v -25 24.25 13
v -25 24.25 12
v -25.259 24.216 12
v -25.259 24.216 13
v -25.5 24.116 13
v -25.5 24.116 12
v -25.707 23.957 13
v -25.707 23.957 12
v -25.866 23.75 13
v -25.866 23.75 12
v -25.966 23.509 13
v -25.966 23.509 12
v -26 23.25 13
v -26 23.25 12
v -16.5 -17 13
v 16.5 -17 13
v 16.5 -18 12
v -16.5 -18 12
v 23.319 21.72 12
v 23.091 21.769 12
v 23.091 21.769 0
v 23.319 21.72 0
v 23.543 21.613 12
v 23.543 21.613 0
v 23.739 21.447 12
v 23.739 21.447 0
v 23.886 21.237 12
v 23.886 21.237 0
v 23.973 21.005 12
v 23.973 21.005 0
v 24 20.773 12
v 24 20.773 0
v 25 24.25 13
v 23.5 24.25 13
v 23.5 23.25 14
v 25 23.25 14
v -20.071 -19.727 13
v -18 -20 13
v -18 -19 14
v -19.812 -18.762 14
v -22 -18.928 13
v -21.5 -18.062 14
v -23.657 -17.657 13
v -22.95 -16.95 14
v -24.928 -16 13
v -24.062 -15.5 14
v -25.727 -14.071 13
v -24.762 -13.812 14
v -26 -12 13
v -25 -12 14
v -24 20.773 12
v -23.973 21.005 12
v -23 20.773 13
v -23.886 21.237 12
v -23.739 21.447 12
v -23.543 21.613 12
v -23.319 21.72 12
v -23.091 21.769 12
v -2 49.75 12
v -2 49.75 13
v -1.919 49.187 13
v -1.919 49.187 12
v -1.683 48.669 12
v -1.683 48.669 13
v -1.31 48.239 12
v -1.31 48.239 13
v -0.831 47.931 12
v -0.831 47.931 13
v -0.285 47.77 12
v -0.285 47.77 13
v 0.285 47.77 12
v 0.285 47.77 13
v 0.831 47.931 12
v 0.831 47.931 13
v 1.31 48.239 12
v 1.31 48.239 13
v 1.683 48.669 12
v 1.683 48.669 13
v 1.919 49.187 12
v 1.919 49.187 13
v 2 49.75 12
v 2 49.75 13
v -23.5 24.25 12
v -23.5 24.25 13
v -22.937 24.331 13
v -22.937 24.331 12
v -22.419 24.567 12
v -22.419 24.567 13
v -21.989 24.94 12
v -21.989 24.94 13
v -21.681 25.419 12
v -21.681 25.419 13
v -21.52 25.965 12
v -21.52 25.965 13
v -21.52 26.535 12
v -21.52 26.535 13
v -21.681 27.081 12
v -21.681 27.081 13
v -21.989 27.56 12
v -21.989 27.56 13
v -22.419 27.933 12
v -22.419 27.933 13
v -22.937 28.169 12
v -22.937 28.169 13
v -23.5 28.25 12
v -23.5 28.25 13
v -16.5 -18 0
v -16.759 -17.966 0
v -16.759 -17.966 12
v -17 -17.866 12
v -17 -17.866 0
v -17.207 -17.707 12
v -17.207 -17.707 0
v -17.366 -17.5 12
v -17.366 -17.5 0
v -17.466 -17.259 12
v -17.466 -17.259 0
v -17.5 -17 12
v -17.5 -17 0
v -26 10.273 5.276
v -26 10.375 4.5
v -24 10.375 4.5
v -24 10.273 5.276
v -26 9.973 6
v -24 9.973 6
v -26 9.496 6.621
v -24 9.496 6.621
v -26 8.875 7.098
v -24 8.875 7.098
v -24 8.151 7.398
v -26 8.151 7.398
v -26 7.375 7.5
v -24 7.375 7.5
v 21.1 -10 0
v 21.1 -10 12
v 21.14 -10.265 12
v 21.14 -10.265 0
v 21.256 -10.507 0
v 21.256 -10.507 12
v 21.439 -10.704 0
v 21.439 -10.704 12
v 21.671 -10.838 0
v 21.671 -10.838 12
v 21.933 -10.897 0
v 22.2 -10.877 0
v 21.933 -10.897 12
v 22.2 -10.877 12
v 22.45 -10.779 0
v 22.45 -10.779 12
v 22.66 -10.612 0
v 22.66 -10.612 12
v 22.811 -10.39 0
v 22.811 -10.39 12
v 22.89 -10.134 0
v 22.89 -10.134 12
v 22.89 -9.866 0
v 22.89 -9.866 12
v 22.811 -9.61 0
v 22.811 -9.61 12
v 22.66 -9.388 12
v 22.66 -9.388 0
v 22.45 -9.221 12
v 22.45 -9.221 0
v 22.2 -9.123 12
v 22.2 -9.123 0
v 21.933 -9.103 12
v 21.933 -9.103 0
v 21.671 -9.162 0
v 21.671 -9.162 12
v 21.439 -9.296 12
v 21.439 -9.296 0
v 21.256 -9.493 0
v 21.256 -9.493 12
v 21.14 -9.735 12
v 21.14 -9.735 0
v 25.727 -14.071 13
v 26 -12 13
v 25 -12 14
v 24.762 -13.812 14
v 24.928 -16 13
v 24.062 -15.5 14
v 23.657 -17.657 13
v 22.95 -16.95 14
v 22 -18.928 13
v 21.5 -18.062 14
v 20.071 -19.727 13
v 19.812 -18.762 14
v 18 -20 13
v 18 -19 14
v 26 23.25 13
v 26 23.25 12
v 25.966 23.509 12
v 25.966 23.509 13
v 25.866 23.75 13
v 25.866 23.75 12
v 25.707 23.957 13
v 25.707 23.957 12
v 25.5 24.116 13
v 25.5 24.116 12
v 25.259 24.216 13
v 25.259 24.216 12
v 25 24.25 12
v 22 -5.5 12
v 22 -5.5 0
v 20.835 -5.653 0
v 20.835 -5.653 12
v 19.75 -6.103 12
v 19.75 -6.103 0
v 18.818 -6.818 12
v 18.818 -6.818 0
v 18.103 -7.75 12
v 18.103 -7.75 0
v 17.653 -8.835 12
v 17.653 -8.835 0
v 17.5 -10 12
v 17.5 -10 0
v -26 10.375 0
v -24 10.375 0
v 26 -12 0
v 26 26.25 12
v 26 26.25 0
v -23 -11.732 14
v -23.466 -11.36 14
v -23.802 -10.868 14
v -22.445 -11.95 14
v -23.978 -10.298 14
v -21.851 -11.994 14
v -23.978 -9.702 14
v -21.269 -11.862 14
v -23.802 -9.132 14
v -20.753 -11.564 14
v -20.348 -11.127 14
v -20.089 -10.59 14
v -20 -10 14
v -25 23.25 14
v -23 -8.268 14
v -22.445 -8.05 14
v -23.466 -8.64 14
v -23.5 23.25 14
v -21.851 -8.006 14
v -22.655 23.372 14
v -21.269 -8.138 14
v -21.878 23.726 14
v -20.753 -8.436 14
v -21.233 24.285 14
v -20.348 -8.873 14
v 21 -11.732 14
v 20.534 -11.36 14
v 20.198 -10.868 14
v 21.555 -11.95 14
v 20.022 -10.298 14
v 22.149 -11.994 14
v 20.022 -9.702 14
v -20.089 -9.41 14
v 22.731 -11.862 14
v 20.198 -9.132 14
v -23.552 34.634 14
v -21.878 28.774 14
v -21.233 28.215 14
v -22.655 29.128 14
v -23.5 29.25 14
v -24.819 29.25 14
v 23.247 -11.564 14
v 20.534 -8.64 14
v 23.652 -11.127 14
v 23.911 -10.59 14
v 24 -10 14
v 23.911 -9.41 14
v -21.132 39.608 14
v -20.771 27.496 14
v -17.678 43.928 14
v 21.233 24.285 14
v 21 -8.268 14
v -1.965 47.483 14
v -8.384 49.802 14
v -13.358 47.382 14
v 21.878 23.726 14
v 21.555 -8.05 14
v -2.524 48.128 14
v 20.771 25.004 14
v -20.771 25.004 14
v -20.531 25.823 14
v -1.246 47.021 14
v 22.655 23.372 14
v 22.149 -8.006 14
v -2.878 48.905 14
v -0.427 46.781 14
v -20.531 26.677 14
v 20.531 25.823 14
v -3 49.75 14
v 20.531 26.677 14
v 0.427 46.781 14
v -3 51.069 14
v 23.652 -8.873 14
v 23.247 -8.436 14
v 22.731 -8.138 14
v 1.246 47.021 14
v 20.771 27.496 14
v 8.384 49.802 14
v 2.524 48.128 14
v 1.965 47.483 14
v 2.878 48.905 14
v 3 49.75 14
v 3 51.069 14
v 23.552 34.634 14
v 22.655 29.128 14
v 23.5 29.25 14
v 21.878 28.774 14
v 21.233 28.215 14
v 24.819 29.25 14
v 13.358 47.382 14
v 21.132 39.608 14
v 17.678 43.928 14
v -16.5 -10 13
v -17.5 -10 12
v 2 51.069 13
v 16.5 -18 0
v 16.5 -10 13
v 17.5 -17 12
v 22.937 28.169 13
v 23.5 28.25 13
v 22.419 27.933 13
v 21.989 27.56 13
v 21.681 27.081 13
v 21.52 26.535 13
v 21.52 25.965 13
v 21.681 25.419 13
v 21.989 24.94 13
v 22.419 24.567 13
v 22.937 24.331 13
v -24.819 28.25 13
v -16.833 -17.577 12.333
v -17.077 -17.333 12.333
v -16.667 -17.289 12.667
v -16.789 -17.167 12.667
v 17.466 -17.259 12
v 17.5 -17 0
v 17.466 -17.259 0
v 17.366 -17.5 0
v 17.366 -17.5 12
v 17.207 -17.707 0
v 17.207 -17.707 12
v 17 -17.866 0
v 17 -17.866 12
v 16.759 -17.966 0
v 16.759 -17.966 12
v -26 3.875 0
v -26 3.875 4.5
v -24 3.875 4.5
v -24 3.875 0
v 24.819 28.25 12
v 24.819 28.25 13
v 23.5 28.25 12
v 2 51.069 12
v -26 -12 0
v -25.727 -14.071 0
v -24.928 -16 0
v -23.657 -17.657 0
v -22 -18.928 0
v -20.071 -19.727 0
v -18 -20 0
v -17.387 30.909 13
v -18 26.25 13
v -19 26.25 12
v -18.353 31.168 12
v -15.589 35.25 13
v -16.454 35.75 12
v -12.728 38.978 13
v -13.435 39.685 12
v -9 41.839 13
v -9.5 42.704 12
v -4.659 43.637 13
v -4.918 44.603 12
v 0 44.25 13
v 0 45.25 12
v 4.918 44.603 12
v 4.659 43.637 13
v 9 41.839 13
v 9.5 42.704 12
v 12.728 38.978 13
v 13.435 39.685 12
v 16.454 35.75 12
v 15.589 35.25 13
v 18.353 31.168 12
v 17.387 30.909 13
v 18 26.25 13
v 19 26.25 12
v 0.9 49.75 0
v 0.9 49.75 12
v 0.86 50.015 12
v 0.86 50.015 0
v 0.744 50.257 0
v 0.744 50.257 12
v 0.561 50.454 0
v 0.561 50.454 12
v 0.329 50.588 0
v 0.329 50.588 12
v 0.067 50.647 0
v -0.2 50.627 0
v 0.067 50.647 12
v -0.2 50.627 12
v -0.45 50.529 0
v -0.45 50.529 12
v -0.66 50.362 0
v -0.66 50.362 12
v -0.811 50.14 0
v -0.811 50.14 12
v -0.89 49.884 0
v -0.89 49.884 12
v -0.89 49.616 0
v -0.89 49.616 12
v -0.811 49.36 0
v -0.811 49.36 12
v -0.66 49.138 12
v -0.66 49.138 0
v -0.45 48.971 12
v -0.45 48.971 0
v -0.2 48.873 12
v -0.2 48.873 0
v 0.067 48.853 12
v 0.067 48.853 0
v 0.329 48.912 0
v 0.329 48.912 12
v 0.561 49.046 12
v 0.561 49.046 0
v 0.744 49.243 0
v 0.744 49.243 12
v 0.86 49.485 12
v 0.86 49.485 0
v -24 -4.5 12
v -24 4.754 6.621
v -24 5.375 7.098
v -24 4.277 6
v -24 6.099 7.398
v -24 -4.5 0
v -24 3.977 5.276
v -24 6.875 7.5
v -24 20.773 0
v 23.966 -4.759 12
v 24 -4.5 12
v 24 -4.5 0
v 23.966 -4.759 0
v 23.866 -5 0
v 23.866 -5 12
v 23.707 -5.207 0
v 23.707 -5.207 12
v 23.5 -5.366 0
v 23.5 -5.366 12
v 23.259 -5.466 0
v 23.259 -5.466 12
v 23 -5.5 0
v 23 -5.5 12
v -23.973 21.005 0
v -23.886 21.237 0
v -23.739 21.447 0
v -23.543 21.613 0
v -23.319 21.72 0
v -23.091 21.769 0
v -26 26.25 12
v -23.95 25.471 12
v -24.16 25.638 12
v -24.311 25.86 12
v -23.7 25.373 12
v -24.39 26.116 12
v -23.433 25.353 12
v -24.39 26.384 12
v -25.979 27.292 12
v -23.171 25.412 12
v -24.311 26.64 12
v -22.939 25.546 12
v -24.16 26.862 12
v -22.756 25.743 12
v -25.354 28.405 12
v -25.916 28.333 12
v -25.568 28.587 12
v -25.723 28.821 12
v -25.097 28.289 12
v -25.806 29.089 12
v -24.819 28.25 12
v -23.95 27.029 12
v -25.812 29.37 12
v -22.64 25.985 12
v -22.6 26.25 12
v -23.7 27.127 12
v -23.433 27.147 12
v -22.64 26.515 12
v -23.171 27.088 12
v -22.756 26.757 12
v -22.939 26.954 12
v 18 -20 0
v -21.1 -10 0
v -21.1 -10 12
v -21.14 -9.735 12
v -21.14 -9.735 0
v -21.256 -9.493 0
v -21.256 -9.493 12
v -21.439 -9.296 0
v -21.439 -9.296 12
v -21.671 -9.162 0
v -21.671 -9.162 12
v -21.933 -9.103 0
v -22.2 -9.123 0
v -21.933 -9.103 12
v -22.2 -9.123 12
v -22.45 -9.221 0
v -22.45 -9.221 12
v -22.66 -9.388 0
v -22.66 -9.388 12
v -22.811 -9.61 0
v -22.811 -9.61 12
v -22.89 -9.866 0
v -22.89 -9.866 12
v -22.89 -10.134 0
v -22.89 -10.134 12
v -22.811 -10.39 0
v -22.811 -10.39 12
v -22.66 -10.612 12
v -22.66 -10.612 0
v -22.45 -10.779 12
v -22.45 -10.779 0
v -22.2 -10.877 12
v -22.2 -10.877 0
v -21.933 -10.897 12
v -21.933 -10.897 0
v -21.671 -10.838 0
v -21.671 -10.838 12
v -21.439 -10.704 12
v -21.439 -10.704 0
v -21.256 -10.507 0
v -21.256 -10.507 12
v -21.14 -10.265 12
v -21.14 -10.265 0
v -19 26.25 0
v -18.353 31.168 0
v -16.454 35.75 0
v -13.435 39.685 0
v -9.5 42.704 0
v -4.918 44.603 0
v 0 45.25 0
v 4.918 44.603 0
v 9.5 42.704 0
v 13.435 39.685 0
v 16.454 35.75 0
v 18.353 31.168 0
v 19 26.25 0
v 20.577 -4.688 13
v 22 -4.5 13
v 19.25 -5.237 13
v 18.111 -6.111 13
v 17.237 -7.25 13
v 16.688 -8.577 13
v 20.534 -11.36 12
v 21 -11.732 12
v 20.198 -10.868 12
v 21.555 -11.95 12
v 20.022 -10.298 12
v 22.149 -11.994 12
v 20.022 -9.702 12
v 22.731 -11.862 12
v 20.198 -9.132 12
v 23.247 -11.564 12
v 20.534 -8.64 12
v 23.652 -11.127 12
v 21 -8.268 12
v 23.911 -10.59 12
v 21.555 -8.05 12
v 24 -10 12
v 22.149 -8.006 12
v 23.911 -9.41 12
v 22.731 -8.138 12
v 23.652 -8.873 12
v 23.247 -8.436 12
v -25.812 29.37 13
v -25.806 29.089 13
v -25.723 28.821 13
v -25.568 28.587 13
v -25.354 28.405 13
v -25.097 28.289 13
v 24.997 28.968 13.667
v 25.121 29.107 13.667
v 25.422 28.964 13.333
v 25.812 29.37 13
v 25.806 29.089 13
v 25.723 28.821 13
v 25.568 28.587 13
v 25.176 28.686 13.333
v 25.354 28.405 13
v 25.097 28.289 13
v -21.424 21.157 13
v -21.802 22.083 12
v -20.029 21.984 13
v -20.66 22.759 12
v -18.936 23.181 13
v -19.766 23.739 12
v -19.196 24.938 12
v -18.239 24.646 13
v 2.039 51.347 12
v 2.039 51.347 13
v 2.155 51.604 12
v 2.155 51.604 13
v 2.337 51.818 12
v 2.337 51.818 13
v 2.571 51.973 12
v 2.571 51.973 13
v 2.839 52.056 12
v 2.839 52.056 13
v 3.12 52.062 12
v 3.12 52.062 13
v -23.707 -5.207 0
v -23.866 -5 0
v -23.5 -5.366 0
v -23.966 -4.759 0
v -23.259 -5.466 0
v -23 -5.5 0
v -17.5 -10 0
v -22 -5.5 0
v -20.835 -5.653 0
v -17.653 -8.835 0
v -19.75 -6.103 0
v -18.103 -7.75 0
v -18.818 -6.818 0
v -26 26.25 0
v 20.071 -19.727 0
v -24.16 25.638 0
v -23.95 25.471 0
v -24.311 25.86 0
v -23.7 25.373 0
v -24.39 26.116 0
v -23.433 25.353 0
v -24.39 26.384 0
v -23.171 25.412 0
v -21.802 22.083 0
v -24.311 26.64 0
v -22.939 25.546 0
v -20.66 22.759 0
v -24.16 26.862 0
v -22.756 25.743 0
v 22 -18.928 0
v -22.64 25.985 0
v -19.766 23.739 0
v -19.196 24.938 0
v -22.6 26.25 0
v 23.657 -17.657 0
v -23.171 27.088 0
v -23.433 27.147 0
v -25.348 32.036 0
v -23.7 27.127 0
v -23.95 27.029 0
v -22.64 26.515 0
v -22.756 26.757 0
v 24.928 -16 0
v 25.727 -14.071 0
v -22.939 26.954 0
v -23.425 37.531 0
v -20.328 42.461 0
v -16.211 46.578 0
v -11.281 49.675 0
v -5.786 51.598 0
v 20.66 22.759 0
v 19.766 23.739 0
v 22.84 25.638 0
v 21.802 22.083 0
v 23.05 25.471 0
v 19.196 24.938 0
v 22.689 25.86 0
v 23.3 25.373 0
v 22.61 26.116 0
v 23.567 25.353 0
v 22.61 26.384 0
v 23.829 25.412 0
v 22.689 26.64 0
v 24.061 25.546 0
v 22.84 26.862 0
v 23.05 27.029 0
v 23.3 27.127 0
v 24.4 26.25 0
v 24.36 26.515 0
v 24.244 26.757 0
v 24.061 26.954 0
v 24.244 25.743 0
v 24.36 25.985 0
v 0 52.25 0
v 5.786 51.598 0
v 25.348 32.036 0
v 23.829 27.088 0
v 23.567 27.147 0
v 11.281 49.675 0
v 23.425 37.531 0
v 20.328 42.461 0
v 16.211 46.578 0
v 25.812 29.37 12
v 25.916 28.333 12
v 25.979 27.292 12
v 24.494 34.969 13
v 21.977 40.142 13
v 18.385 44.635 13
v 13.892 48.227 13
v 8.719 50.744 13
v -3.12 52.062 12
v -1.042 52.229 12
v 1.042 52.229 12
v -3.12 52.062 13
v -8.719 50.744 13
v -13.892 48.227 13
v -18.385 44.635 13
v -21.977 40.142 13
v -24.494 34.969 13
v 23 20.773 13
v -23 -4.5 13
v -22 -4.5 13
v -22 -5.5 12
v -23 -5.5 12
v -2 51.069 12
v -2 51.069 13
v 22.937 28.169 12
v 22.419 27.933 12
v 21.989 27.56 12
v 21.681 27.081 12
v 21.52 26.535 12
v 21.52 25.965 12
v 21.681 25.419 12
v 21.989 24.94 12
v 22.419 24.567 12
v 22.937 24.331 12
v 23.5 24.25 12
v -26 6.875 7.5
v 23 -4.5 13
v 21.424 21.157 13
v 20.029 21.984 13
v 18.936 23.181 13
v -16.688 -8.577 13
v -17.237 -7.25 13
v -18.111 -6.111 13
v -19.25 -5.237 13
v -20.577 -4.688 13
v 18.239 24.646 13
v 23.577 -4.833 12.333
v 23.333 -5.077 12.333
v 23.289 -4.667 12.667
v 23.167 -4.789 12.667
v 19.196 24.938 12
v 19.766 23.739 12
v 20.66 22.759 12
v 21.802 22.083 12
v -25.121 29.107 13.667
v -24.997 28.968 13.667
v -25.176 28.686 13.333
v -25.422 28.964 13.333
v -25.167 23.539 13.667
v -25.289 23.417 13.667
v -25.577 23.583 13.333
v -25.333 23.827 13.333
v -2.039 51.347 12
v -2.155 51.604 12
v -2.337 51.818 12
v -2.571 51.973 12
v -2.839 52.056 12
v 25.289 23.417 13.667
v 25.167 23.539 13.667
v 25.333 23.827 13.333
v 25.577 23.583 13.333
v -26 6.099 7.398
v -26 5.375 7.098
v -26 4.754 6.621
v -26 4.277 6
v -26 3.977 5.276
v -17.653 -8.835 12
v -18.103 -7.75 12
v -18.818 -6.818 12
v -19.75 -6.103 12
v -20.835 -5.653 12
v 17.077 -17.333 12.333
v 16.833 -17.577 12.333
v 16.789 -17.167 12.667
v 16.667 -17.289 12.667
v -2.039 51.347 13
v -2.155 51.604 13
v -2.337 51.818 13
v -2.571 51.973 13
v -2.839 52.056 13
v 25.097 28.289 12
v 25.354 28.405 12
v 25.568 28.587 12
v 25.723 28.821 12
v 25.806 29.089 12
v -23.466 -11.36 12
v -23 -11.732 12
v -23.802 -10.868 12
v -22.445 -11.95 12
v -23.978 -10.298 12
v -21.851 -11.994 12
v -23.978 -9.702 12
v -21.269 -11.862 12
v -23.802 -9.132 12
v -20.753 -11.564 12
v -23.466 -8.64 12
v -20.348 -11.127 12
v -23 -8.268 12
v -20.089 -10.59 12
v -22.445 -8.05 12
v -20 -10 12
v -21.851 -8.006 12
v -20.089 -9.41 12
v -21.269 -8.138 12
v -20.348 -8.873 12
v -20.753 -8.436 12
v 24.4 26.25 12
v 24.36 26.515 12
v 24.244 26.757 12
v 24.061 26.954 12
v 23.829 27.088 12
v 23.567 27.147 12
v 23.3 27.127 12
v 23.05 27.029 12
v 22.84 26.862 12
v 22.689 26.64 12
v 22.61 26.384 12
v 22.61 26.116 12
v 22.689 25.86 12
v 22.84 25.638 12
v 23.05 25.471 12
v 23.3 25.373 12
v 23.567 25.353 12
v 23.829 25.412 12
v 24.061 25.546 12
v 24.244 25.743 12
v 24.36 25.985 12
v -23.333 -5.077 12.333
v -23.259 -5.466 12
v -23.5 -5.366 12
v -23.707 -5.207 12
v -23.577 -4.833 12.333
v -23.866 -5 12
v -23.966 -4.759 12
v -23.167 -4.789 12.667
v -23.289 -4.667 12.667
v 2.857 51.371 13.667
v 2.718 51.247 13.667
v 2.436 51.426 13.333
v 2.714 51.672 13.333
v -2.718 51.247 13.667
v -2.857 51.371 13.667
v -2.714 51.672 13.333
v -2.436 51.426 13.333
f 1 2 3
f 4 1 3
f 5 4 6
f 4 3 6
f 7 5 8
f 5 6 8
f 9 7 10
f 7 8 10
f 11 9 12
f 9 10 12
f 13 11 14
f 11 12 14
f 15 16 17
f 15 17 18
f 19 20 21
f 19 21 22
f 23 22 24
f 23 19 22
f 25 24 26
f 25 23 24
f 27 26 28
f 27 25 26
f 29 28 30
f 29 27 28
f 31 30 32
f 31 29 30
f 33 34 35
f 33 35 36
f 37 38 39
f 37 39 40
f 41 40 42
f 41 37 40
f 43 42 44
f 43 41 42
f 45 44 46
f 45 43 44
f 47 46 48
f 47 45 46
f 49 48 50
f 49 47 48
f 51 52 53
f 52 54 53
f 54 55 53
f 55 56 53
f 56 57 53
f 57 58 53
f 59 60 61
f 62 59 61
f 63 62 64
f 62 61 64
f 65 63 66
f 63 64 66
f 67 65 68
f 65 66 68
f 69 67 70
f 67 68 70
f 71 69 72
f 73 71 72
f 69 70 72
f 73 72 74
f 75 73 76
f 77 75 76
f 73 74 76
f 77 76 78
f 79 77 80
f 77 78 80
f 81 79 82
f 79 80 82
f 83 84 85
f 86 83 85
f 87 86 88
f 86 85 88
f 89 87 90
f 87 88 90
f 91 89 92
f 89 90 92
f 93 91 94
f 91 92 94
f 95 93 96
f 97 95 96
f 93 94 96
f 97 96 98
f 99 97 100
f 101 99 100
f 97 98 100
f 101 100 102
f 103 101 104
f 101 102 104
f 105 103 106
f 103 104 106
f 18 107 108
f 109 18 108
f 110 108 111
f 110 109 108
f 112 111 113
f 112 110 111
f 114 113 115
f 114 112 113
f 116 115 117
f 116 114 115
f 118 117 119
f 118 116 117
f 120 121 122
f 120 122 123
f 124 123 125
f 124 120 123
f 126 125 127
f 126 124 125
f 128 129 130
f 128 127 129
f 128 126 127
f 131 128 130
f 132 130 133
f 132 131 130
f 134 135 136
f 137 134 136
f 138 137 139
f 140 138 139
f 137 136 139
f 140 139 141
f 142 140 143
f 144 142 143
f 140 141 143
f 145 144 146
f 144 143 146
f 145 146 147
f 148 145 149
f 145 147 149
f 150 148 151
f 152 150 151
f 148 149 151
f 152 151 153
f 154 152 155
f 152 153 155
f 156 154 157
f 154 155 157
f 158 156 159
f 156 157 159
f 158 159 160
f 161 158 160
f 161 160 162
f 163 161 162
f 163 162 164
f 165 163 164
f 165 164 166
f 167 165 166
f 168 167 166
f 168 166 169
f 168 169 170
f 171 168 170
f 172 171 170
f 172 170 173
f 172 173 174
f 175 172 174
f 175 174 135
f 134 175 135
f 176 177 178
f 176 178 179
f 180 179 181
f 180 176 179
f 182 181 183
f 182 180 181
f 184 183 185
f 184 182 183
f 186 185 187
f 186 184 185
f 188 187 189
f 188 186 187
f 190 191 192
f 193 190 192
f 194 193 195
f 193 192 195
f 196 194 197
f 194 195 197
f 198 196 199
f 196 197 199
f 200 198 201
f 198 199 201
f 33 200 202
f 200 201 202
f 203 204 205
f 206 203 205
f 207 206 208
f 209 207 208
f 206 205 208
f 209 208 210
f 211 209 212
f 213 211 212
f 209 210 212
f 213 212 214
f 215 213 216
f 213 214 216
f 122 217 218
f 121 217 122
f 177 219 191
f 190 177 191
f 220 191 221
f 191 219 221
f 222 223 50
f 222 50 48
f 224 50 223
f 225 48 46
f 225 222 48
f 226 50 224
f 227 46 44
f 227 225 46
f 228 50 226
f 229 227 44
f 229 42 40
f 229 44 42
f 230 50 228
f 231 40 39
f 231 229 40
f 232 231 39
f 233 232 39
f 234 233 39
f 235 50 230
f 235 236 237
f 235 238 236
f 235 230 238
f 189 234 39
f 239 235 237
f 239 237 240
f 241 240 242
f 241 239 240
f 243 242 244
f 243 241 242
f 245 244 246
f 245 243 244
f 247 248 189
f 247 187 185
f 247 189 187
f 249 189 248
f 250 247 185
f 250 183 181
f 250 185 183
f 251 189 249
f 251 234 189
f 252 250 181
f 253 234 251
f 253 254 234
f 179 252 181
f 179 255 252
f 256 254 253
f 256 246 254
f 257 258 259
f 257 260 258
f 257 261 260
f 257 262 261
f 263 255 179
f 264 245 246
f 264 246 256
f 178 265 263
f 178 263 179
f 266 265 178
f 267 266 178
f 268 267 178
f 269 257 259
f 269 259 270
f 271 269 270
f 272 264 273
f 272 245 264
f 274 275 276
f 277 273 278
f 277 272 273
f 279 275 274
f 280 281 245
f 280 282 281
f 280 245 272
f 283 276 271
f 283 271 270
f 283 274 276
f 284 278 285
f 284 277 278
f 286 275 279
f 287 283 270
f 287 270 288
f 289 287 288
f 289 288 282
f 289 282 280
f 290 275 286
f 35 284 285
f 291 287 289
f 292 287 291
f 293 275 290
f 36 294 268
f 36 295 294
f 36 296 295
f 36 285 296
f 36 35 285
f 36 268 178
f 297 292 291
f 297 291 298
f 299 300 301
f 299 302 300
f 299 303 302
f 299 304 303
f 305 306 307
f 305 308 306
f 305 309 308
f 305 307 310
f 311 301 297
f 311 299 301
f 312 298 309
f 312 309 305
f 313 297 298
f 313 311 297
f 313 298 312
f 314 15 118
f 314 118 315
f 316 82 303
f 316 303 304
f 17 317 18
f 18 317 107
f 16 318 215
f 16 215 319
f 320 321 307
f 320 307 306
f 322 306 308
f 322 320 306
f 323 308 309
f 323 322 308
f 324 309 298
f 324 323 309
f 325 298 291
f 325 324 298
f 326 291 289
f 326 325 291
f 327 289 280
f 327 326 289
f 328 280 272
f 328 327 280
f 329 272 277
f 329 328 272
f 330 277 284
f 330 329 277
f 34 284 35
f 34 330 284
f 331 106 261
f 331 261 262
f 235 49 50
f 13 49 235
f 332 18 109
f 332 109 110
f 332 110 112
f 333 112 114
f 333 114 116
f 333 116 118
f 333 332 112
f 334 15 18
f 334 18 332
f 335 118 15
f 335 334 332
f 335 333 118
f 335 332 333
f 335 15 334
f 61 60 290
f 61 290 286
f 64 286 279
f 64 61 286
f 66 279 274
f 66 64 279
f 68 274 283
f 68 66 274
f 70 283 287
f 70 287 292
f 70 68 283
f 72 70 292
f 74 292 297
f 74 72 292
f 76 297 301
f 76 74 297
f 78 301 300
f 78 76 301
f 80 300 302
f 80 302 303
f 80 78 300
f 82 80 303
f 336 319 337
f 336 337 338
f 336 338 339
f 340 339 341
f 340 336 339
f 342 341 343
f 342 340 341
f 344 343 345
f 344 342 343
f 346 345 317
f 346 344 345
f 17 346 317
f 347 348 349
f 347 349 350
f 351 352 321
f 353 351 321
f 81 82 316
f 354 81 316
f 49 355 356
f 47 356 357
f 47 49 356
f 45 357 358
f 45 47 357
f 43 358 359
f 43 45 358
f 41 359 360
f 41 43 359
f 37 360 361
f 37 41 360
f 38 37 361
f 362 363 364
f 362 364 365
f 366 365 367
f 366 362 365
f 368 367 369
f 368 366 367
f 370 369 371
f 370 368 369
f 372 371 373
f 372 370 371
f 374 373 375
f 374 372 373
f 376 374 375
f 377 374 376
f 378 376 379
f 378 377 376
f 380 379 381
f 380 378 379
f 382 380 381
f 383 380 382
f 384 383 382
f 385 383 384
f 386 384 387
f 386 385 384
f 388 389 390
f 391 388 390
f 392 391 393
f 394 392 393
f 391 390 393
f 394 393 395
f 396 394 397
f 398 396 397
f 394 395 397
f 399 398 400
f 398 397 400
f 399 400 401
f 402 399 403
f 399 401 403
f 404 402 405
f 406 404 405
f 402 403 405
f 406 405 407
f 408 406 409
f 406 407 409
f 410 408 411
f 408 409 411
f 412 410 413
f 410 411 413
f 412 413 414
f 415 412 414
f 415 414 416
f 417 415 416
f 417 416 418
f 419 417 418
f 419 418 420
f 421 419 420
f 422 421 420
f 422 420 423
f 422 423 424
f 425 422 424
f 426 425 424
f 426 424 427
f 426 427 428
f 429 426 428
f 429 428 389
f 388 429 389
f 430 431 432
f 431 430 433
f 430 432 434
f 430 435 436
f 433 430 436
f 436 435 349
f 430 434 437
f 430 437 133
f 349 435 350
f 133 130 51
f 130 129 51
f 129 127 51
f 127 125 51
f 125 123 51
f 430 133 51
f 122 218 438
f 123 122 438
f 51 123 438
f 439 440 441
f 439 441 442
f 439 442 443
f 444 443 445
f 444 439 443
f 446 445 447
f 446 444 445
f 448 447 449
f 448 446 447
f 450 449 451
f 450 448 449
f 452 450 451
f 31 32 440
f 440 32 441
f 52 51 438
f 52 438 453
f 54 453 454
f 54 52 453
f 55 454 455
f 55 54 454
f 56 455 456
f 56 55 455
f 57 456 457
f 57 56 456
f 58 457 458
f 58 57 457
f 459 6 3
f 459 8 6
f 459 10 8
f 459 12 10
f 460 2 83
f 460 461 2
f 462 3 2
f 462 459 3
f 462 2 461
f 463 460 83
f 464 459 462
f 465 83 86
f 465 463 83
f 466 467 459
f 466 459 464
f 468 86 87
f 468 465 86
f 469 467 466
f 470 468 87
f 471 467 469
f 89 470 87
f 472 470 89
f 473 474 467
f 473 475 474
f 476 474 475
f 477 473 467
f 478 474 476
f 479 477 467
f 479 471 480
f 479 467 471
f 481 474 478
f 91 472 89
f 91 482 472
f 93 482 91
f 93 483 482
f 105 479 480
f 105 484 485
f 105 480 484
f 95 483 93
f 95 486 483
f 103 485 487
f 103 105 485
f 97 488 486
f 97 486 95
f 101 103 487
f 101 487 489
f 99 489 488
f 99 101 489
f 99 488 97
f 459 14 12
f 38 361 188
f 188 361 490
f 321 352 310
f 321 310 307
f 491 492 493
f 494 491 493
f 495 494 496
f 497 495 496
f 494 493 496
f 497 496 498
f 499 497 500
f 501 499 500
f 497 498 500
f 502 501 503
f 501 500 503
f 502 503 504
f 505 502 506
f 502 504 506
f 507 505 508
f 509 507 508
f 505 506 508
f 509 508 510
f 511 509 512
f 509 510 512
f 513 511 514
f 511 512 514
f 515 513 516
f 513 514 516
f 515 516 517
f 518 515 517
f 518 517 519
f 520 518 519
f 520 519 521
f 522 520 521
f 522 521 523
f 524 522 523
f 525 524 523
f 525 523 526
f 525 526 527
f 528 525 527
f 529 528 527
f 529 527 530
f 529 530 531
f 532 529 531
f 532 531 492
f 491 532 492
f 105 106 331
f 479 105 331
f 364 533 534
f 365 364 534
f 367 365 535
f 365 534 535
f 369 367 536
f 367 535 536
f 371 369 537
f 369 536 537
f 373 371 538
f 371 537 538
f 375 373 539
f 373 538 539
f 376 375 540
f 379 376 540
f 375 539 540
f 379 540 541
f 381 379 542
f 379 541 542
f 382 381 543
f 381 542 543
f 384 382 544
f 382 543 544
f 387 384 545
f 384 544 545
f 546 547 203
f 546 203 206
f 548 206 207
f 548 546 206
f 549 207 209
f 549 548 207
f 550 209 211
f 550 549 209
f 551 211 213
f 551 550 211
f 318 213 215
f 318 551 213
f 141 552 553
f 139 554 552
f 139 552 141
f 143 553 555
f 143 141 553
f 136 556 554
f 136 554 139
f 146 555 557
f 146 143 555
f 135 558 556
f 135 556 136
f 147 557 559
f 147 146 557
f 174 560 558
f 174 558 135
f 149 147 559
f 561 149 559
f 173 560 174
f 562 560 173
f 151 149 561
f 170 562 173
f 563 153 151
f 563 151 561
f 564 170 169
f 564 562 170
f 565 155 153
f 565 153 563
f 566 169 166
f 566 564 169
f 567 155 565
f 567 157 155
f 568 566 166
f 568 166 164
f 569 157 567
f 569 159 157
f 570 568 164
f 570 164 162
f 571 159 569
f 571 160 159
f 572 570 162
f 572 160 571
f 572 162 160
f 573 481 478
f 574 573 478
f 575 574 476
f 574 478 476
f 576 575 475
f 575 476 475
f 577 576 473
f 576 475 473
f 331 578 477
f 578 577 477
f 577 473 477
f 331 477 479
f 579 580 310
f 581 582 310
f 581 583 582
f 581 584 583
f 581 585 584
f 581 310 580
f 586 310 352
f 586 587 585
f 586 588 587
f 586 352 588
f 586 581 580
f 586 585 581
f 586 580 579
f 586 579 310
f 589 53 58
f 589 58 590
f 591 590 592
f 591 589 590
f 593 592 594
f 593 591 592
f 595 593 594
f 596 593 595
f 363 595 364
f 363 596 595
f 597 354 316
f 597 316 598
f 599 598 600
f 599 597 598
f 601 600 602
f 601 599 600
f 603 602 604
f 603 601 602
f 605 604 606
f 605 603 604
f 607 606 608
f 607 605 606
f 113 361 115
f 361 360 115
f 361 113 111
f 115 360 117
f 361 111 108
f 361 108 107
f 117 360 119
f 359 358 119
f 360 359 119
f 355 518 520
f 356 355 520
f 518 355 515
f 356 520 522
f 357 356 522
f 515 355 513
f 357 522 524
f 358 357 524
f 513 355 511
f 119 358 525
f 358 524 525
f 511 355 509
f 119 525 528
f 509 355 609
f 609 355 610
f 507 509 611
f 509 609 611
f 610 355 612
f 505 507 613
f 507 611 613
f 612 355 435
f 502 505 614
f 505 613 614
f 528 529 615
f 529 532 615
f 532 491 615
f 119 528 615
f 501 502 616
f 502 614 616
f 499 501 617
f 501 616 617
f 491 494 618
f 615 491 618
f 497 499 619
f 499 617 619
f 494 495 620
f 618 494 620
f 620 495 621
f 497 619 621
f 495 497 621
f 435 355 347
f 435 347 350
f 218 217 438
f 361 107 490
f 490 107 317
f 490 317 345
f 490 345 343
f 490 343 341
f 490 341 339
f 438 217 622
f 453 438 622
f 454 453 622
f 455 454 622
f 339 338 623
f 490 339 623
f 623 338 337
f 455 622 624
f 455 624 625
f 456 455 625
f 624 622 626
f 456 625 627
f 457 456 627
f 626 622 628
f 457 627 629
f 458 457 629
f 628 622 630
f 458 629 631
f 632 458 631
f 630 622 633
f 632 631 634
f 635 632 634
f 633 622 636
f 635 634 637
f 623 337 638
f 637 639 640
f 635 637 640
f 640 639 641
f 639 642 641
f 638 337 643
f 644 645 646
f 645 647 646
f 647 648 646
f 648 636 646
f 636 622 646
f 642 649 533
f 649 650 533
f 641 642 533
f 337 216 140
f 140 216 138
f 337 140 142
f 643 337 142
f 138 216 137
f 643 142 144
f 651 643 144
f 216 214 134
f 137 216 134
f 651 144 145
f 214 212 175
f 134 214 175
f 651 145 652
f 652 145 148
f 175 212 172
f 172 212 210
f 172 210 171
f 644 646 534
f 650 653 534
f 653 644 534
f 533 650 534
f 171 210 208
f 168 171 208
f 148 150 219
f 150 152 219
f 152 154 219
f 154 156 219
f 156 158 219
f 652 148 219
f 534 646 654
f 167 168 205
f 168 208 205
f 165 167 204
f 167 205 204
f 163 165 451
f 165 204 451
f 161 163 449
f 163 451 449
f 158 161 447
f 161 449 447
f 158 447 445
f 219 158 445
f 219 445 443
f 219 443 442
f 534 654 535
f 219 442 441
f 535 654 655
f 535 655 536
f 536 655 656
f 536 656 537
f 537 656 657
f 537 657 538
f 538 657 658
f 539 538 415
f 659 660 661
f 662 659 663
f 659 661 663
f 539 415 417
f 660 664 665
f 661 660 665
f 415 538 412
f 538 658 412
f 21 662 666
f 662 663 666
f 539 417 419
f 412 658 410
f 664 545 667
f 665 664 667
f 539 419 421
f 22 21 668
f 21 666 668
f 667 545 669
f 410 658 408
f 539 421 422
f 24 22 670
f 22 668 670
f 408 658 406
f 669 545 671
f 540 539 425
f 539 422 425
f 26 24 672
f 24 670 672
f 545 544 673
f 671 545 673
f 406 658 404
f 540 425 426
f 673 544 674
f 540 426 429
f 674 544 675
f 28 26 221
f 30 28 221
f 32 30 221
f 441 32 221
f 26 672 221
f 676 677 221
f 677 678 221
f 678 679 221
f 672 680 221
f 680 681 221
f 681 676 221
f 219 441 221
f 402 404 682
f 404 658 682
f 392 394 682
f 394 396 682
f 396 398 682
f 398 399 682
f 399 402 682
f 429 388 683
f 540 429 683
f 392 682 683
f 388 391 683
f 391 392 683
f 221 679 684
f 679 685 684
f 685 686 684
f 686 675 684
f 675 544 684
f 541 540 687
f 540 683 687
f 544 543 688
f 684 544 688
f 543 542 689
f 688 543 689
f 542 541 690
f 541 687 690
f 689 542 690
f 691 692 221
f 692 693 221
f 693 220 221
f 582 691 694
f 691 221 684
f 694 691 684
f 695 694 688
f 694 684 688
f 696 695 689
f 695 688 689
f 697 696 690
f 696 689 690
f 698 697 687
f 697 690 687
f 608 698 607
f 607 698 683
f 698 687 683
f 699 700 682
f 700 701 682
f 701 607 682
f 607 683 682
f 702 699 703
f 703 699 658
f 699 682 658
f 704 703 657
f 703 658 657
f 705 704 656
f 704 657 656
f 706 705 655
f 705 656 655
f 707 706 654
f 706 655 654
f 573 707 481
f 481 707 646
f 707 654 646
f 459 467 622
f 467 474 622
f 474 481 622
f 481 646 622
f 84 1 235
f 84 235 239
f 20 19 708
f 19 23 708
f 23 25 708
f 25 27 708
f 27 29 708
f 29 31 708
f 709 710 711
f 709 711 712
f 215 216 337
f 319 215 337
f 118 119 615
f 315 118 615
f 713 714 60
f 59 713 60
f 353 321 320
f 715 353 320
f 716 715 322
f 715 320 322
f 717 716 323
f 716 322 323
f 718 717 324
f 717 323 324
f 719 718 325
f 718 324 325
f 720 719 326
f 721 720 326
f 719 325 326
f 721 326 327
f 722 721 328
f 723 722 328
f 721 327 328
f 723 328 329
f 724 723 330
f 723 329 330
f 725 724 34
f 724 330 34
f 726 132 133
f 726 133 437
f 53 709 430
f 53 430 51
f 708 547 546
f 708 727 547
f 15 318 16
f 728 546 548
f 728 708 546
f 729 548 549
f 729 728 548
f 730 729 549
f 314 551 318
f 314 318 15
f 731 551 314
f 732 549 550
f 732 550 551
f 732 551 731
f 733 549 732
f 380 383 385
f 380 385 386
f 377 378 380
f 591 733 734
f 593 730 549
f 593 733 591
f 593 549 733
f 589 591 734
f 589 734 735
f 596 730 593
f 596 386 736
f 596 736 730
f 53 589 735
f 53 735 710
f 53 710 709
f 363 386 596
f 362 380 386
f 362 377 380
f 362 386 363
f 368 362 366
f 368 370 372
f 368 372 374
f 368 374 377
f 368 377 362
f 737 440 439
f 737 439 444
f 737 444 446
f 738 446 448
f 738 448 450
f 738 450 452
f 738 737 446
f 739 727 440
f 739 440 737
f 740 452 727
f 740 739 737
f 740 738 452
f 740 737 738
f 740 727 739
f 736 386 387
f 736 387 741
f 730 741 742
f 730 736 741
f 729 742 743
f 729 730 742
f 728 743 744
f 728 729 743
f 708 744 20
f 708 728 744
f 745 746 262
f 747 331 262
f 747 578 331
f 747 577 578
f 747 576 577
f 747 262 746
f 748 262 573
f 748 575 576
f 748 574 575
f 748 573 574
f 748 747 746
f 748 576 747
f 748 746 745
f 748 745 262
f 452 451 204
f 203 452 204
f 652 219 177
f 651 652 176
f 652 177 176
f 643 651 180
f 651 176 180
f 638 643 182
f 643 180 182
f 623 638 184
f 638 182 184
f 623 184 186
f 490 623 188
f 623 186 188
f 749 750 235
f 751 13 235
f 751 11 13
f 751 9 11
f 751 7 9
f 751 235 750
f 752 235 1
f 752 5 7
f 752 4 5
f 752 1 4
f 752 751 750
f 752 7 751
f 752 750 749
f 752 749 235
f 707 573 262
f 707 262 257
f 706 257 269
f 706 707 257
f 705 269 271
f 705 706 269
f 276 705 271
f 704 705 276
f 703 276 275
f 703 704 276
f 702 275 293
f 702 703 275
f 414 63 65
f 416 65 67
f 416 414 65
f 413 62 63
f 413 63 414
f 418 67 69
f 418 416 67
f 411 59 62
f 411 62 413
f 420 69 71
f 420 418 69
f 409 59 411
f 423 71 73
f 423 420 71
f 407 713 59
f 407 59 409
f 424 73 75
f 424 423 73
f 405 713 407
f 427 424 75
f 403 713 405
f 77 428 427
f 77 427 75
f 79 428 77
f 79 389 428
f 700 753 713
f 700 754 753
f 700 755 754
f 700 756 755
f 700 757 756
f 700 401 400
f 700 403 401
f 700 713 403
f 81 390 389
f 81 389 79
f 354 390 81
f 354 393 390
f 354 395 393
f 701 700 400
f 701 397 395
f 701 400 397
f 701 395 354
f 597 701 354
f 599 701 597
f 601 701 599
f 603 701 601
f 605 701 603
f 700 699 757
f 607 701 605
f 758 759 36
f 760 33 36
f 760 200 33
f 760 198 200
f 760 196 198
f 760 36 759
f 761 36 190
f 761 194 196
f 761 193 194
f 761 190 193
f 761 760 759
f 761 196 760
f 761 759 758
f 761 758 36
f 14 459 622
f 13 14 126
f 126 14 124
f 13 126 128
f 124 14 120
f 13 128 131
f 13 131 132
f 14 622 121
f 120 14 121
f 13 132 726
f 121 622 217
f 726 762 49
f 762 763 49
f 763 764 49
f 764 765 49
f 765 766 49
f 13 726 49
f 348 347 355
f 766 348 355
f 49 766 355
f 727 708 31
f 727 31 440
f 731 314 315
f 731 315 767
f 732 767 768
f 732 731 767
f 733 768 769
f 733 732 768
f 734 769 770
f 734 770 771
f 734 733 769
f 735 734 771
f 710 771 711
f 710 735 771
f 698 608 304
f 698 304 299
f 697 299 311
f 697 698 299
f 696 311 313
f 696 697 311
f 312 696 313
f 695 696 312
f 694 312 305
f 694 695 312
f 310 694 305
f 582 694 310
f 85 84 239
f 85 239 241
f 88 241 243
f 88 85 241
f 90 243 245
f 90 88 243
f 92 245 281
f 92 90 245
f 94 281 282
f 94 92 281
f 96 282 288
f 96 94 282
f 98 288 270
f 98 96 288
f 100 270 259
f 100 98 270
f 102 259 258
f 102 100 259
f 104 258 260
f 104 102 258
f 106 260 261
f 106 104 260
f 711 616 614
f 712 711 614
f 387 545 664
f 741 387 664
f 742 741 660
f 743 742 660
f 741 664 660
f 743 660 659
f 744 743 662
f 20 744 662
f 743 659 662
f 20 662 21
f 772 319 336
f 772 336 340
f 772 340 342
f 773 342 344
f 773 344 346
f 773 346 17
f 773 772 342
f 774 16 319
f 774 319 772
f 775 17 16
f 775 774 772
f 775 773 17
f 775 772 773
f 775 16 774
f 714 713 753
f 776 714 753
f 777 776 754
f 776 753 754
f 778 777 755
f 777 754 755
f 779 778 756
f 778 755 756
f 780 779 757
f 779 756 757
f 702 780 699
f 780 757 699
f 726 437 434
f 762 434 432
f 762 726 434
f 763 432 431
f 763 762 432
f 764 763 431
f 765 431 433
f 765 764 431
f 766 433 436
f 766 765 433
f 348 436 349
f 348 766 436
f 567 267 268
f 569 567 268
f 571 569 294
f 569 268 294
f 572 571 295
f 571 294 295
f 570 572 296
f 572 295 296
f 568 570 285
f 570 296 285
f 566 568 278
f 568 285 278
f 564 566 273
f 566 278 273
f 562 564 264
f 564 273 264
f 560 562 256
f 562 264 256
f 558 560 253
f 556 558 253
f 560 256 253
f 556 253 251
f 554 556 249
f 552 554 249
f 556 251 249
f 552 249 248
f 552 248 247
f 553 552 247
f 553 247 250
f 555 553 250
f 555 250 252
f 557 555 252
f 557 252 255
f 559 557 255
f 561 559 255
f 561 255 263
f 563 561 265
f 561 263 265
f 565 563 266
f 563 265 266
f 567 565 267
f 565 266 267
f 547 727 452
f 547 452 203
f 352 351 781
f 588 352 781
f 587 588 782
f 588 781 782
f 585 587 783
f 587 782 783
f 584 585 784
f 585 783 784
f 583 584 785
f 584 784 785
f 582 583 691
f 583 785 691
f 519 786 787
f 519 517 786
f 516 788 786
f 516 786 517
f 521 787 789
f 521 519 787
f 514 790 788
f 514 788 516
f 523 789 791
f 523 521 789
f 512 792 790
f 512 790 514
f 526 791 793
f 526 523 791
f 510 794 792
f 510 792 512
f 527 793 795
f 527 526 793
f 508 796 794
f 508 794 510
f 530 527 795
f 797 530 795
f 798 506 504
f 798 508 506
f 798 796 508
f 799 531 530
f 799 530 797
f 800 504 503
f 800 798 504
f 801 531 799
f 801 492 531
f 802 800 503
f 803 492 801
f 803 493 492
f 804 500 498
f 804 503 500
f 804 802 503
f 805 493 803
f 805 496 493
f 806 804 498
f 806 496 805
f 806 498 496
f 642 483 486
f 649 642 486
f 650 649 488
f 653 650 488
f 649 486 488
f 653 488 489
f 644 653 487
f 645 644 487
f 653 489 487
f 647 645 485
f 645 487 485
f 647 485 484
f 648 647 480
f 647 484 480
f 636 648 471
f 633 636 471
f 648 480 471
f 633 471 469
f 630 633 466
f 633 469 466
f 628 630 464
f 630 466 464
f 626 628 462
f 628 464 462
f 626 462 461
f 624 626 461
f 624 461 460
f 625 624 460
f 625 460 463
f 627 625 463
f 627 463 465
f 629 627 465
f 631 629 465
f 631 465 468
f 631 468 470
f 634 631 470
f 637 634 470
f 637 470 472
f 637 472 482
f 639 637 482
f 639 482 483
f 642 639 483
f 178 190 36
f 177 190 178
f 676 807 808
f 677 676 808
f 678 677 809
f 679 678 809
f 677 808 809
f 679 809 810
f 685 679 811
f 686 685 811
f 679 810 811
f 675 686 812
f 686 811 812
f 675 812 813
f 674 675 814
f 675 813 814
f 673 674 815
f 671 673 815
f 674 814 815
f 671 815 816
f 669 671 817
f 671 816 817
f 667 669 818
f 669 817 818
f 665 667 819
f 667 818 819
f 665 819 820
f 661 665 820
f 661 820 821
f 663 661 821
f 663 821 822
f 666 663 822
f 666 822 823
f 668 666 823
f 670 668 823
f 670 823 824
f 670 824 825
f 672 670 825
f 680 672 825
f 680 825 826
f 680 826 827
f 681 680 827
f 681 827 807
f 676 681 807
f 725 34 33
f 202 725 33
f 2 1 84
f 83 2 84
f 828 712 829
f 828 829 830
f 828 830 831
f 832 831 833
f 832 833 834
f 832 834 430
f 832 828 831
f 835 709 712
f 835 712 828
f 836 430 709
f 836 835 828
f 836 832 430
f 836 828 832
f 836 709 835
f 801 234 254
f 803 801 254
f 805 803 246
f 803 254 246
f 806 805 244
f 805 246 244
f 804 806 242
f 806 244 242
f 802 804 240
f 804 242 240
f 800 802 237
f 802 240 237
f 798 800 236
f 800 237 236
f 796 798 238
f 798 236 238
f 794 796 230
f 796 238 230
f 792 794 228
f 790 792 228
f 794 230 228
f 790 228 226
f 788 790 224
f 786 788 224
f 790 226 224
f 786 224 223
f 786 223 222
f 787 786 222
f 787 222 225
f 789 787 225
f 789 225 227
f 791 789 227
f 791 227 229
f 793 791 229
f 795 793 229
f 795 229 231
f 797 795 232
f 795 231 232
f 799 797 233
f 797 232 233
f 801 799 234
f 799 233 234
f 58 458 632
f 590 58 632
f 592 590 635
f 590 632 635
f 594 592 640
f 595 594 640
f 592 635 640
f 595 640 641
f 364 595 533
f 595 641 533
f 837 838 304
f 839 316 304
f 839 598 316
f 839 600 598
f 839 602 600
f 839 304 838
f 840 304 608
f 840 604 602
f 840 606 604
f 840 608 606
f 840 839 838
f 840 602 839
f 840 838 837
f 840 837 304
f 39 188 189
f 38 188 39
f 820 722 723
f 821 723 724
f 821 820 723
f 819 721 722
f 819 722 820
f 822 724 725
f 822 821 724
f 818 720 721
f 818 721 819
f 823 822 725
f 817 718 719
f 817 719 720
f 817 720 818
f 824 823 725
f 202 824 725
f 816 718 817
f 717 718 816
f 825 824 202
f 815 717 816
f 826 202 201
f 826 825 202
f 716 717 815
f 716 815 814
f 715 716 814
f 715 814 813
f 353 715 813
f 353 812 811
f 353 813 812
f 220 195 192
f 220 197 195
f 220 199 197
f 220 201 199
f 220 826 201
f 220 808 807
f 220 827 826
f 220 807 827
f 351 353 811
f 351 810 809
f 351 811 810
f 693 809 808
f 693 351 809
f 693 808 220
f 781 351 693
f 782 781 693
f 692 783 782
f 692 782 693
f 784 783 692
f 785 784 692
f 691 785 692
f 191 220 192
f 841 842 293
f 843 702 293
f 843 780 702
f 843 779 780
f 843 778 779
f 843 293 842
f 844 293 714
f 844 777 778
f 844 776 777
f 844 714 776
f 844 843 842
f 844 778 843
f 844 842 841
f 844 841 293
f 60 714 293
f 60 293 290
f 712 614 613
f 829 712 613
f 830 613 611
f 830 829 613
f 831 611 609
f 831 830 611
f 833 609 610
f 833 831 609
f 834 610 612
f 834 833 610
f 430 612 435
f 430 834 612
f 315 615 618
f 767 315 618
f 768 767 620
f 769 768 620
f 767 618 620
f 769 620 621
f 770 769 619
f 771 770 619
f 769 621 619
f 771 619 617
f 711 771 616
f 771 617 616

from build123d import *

# Parameters (mm, degrees)
SKETCH_2_R          = 19
SKETCH_2_R_2        = 2.75
EXTRUDE_1_DEPTH     = 14
SKETCH_3_R          = 21.125
CUT_EXTRUDE_1_DEPTH = 12.15
FILLET_1_R          = 8
SKETCH_5_R          = 0.9
CUT_EXTRUDE_3_DEPTH = 61.017185039
SKETCH_6_R          = 21.125
SKETCH_6_R_2        = 2.75
EXTRUDE_2_DEPTH     = 14
CUT_EXTRUDE_4_DEPTH = 13
SKETCH_8_R          = 2
CUT_EXTRUDE_5_DEPTH = 2
FILLET_2_R          = 1
CUT_EXTRUDE_6_REACH = 77.034
CHAMFER_1_SIZE      = 1


with BuildPart() as part:
    # Эскиз2 → Бобышка-Вытянуть1 (new body)
    with BuildSketch(Plane.XY):
        with BuildLine():
            ThreePointArc((26, 26.25), (0, 52.25), (-26, 26.25))
            Line((-26, 26.25), (-26, -20))
            Line((-26, -20), (26, -20))
            Line((26, -20), (26, 26.25))
        make_face()
        with Locations((0, 26.25)):
            Circle(SKETCH_2_R, mode=Mode.SUBTRACT)
        with Locations((12, -10)):
            Circle(SKETCH_2_R_2, mode=Mode.SUBTRACT)
        with Locations((-12, -10)):
            Circle(SKETCH_2_R_2, mode=Mode.SUBTRACT)
    extrude(amount=EXTRUDE_1_DEPTH)

    # Эскиз3 → Вырез-Вытянуть1 (cut)
    with BuildSketch(Plane.XY.offset(14)):
        with Locations((0, 26.25)):
            Circle(SKETCH_3_R)
    extrude(amount=-CUT_EXTRUDE_1_DEPTH, mode=Mode.SUBTRACT)

    # Скругление1
    fillet_1_edges = [part.edges().sort_by_distance(p)[0] for p in [
        (26, -20, 7),
        (-26, -20, 7),
    ]]
    fillet(fillet_1_edges, radius=FILLET_1_R)

    # Эскиз5 → Вырез-Вытянуть3 (cut, through all)
    with BuildSketch(Plane.XY.offset(14)):
        with Locations((0, 49.75)):
            Circle(SKETCH_5_R)
        with Locations((-23.5, 26.25)):
            Circle(SKETCH_5_R)
        with Locations((23.5, 26.25)):
            Circle(SKETCH_5_R)
        with Locations((-22, -10)):
            Circle(SKETCH_5_R)
        with Locations(Location((22, -10, 0), (0, 0, 180))):
            Circle(SKETCH_5_R)
    extrude(amount=-CUT_EXTRUDE_3_DEPTH, mode=Mode.SUBTRACT)

    # Эскиз6 → Бобышка-Вытянуть2 (add, through all)
    with BuildSketch(Plane.XY.offset(14)):
        with Locations((0, 26.25)):
            Circle(SKETCH_6_R)
        with Locations((-12, -10)):
            Circle(SKETCH_6_R_2)
        with Locations((12, -10)):
            Circle(SKETCH_6_R_2)
    extrude(amount=-EXTRUDE_2_DEPTH)

    # Эскиз7 → Вырез-Вытянуть4 (cut)
    with BuildSketch(Plane(origin=(0, 0, 0), x_dir=(-1, 0, 0), z_dir=(0, 0, -1))):
        with BuildLine():
            Line((-23.5, 21.75), (-24, 21.75))
            Line((-24, 21.75), (-24, -5.5))
            Line((-24, -5.5), (-22, -5.5))
            ThreePointArc((-22, -5.5), (-18.818019485, -6.818019485), (-17.5, -10))
            Line((-17.5, -10), (-17.5, -18))
            Line((-17.5, -18), (17.5, -18))
            Line((17.5, -18), (17.5, -10))
            ThreePointArc((17.5, -10), (18.818019485, -6.818019485), (22, -5.5))
            Line((22, -5.5), (24, -5.5))
            Line((24, -5.5), (24, 21.75))
            Line((24, 21.75), (23.5, 21.75))
            ThreePointArc((23.5, 21.75), (20.318019485, 23.068019485), (19, 26.25))
            ThreePointArc((19, 26.25), (0, 45.25), (-19, 26.25))
            ThreePointArc((-19, 26.25), (-20.318019485, 23.068019485), (-23.5, 21.75))
        make_face()
    extrude(amount=-CUT_EXTRUDE_4_DEPTH, mode=Mode.SUBTRACT)

    # Эскиз8 → Вырез-Вытянуть5 (cut)
    with BuildSketch(Plane.XY.offset(14)):
        with Locations((-22, -10)):
            Circle(SKETCH_8_R)
        with Locations((22, -10)):
            Circle(SKETCH_8_R)
        with BuildLine():
            Line((2, 49.75), (2, 52.25))
            Line((2, 52.25), (-2, 52.25))
            Line((-2, 52.25), (-2, 49.75))
            ThreePointArc((-2, 49.75), (0, 47.75), (2, 49.75))
        make_face()
        with BuildLine():
            Line((26, 28.25), (23.5, 28.25))
            ThreePointArc((23.5, 28.25), (21.5, 26.25), (23.5, 24.25))
            Line((23.5, 24.25), (26, 24.25))
            Line((26, 24.25), (26, 28.25))
        make_face()
        with BuildLine():
            Line((-26, 24.25), (-23.5, 24.25))
            ThreePointArc((-23.5, 24.25), (-21.5, 26.25), (-23.5, 28.25))
            Line((-23.5, 28.25), (-26, 28.25))
            Line((-26, 28.25), (-26, 24.25))
        make_face()
    extrude(amount=-CUT_EXTRUDE_5_DEPTH, mode=Mode.SUBTRACT)

    # Скругление2
    fillet_2_edges = [part.edges().sort_by_distance(p)[0] for p in [
        (24, -5.5, 6.5),
        (17.5, -18, 6.5),
        (-17.5, -18, 6.5),
        (-24, -5.5, 6.5),
        (-24, 21.75, 6.5),
        (24, 21.75, 6.5),
        (26, 24.25, 13),
        (25.922962794, 28.25, 13),
        (2, 52.172962794, 13),
        (-2, 52.172962794, 13),
        (-26, 24.25, 13),
        (-25.922962794, 28.25, 13),
    ]]
    fillet(fillet_2_edges, radius=FILLET_2_R)

    # Эскиз9 → Вырез-Вытянуть6 (cut, up to next)
    with BuildSketch(Plane.ZY.offset(26), mode=Mode.PRIVATE) as cut_extrude_6_sk1:
        with BuildLine():
            Line((-7.5, 10.375), (4.5, 10.375))
            ThreePointArc((4.5, 10.375), (6.621320344, 9.496320344), (7.5, 7.375))
            Line((7.5, 7.375), (7.5, 6.875))
            ThreePointArc((7.5, 6.875), (6.621320344, 4.753679656), (4.5, 3.875))
            Line((4.5, 3.875), (-7.5, 3.875))
            Line((-7.5, 3.875), (-7.5, 10.375))
        make_face()
    cut_extrude_6_tool1 = extrude(cut_extrude_6_sk1.sketch, amount=-CUT_EXTRUDE_6_REACH, mode=Mode.PRIVATE) & part.part
    add(cut_extrude_6_tool1.solids().sort_by_distance((-26, 7.125, -0.281755))[0], mode=Mode.SUBTRACT)

    # Фаска1
    chamfer_1_edges = [part.edges().sort_by_distance(p)[0] for p in [
        (2, 50.409673646, 14),
        (0, 47.75, 14),
        (21.5, 26.25, 14),
        (24.25, 24.25, 14),
        (-24.159673646, 28.25, 14),
        (-21.5, 26.25, 14),
        (22.5, -5.5, 13),
        (24, 8.136387212, 13),
        (0, -18, 13),
        (-17.5, -13.5, 13),
        (-24, 8.136387212, 13),
        (-20.176529744, 23.216100619, 13),
        (23.738548946, 21.446974287, 13),
        (-23.738548945, 21.446974288, 13),
        (-23.707106781, -5.207106781, 13),
        (-17.207106781, -17.707106781, 13),
        (17.207106781, -17.707106781, 13),
        (23.707106781, -5.207106781, 13),
        (26, 5.625, 14),
        (-2, 50.409673646, 14),
        (-18.384776311, 44.634776311, 14),
        (-24.25, 24.25, 14),
        (-26, 5.625, 14),
        (24.159673646, 28.25, 14),
        (18.384776311, 44.634776311, 14),
        (-25.567678769, 28.586675042, 14),
        (-25.707106781, 23.957106781, 14),
        (-2.336675042, 51.817678769, 14),
        (2.336675042, 51.817678769, 14),
        (25.567678769, 28.586675042, 14),
        (25.707106781, 23.957106781, 14),
        (0, -20, 14),
        (23.656854249, -17.656854249, 14),
        (-23.656854249, -17.656854249, 14),
        (20.176529744, 23.216100619, 13),
        (0, 45.25, 13),
        (-22.5, -5.5, 13),
        (-18.818019485, -6.818019485, 13),
        (17.5, -13.5, 13),
        (18.818019485, -6.818019485, 13),
    ]]
    chamfer(chamfer_1_edges, length=CHAMFER_1_SIZE - 0.0001)  # a hair under: the kernel refuses the full size


solid = part.part
